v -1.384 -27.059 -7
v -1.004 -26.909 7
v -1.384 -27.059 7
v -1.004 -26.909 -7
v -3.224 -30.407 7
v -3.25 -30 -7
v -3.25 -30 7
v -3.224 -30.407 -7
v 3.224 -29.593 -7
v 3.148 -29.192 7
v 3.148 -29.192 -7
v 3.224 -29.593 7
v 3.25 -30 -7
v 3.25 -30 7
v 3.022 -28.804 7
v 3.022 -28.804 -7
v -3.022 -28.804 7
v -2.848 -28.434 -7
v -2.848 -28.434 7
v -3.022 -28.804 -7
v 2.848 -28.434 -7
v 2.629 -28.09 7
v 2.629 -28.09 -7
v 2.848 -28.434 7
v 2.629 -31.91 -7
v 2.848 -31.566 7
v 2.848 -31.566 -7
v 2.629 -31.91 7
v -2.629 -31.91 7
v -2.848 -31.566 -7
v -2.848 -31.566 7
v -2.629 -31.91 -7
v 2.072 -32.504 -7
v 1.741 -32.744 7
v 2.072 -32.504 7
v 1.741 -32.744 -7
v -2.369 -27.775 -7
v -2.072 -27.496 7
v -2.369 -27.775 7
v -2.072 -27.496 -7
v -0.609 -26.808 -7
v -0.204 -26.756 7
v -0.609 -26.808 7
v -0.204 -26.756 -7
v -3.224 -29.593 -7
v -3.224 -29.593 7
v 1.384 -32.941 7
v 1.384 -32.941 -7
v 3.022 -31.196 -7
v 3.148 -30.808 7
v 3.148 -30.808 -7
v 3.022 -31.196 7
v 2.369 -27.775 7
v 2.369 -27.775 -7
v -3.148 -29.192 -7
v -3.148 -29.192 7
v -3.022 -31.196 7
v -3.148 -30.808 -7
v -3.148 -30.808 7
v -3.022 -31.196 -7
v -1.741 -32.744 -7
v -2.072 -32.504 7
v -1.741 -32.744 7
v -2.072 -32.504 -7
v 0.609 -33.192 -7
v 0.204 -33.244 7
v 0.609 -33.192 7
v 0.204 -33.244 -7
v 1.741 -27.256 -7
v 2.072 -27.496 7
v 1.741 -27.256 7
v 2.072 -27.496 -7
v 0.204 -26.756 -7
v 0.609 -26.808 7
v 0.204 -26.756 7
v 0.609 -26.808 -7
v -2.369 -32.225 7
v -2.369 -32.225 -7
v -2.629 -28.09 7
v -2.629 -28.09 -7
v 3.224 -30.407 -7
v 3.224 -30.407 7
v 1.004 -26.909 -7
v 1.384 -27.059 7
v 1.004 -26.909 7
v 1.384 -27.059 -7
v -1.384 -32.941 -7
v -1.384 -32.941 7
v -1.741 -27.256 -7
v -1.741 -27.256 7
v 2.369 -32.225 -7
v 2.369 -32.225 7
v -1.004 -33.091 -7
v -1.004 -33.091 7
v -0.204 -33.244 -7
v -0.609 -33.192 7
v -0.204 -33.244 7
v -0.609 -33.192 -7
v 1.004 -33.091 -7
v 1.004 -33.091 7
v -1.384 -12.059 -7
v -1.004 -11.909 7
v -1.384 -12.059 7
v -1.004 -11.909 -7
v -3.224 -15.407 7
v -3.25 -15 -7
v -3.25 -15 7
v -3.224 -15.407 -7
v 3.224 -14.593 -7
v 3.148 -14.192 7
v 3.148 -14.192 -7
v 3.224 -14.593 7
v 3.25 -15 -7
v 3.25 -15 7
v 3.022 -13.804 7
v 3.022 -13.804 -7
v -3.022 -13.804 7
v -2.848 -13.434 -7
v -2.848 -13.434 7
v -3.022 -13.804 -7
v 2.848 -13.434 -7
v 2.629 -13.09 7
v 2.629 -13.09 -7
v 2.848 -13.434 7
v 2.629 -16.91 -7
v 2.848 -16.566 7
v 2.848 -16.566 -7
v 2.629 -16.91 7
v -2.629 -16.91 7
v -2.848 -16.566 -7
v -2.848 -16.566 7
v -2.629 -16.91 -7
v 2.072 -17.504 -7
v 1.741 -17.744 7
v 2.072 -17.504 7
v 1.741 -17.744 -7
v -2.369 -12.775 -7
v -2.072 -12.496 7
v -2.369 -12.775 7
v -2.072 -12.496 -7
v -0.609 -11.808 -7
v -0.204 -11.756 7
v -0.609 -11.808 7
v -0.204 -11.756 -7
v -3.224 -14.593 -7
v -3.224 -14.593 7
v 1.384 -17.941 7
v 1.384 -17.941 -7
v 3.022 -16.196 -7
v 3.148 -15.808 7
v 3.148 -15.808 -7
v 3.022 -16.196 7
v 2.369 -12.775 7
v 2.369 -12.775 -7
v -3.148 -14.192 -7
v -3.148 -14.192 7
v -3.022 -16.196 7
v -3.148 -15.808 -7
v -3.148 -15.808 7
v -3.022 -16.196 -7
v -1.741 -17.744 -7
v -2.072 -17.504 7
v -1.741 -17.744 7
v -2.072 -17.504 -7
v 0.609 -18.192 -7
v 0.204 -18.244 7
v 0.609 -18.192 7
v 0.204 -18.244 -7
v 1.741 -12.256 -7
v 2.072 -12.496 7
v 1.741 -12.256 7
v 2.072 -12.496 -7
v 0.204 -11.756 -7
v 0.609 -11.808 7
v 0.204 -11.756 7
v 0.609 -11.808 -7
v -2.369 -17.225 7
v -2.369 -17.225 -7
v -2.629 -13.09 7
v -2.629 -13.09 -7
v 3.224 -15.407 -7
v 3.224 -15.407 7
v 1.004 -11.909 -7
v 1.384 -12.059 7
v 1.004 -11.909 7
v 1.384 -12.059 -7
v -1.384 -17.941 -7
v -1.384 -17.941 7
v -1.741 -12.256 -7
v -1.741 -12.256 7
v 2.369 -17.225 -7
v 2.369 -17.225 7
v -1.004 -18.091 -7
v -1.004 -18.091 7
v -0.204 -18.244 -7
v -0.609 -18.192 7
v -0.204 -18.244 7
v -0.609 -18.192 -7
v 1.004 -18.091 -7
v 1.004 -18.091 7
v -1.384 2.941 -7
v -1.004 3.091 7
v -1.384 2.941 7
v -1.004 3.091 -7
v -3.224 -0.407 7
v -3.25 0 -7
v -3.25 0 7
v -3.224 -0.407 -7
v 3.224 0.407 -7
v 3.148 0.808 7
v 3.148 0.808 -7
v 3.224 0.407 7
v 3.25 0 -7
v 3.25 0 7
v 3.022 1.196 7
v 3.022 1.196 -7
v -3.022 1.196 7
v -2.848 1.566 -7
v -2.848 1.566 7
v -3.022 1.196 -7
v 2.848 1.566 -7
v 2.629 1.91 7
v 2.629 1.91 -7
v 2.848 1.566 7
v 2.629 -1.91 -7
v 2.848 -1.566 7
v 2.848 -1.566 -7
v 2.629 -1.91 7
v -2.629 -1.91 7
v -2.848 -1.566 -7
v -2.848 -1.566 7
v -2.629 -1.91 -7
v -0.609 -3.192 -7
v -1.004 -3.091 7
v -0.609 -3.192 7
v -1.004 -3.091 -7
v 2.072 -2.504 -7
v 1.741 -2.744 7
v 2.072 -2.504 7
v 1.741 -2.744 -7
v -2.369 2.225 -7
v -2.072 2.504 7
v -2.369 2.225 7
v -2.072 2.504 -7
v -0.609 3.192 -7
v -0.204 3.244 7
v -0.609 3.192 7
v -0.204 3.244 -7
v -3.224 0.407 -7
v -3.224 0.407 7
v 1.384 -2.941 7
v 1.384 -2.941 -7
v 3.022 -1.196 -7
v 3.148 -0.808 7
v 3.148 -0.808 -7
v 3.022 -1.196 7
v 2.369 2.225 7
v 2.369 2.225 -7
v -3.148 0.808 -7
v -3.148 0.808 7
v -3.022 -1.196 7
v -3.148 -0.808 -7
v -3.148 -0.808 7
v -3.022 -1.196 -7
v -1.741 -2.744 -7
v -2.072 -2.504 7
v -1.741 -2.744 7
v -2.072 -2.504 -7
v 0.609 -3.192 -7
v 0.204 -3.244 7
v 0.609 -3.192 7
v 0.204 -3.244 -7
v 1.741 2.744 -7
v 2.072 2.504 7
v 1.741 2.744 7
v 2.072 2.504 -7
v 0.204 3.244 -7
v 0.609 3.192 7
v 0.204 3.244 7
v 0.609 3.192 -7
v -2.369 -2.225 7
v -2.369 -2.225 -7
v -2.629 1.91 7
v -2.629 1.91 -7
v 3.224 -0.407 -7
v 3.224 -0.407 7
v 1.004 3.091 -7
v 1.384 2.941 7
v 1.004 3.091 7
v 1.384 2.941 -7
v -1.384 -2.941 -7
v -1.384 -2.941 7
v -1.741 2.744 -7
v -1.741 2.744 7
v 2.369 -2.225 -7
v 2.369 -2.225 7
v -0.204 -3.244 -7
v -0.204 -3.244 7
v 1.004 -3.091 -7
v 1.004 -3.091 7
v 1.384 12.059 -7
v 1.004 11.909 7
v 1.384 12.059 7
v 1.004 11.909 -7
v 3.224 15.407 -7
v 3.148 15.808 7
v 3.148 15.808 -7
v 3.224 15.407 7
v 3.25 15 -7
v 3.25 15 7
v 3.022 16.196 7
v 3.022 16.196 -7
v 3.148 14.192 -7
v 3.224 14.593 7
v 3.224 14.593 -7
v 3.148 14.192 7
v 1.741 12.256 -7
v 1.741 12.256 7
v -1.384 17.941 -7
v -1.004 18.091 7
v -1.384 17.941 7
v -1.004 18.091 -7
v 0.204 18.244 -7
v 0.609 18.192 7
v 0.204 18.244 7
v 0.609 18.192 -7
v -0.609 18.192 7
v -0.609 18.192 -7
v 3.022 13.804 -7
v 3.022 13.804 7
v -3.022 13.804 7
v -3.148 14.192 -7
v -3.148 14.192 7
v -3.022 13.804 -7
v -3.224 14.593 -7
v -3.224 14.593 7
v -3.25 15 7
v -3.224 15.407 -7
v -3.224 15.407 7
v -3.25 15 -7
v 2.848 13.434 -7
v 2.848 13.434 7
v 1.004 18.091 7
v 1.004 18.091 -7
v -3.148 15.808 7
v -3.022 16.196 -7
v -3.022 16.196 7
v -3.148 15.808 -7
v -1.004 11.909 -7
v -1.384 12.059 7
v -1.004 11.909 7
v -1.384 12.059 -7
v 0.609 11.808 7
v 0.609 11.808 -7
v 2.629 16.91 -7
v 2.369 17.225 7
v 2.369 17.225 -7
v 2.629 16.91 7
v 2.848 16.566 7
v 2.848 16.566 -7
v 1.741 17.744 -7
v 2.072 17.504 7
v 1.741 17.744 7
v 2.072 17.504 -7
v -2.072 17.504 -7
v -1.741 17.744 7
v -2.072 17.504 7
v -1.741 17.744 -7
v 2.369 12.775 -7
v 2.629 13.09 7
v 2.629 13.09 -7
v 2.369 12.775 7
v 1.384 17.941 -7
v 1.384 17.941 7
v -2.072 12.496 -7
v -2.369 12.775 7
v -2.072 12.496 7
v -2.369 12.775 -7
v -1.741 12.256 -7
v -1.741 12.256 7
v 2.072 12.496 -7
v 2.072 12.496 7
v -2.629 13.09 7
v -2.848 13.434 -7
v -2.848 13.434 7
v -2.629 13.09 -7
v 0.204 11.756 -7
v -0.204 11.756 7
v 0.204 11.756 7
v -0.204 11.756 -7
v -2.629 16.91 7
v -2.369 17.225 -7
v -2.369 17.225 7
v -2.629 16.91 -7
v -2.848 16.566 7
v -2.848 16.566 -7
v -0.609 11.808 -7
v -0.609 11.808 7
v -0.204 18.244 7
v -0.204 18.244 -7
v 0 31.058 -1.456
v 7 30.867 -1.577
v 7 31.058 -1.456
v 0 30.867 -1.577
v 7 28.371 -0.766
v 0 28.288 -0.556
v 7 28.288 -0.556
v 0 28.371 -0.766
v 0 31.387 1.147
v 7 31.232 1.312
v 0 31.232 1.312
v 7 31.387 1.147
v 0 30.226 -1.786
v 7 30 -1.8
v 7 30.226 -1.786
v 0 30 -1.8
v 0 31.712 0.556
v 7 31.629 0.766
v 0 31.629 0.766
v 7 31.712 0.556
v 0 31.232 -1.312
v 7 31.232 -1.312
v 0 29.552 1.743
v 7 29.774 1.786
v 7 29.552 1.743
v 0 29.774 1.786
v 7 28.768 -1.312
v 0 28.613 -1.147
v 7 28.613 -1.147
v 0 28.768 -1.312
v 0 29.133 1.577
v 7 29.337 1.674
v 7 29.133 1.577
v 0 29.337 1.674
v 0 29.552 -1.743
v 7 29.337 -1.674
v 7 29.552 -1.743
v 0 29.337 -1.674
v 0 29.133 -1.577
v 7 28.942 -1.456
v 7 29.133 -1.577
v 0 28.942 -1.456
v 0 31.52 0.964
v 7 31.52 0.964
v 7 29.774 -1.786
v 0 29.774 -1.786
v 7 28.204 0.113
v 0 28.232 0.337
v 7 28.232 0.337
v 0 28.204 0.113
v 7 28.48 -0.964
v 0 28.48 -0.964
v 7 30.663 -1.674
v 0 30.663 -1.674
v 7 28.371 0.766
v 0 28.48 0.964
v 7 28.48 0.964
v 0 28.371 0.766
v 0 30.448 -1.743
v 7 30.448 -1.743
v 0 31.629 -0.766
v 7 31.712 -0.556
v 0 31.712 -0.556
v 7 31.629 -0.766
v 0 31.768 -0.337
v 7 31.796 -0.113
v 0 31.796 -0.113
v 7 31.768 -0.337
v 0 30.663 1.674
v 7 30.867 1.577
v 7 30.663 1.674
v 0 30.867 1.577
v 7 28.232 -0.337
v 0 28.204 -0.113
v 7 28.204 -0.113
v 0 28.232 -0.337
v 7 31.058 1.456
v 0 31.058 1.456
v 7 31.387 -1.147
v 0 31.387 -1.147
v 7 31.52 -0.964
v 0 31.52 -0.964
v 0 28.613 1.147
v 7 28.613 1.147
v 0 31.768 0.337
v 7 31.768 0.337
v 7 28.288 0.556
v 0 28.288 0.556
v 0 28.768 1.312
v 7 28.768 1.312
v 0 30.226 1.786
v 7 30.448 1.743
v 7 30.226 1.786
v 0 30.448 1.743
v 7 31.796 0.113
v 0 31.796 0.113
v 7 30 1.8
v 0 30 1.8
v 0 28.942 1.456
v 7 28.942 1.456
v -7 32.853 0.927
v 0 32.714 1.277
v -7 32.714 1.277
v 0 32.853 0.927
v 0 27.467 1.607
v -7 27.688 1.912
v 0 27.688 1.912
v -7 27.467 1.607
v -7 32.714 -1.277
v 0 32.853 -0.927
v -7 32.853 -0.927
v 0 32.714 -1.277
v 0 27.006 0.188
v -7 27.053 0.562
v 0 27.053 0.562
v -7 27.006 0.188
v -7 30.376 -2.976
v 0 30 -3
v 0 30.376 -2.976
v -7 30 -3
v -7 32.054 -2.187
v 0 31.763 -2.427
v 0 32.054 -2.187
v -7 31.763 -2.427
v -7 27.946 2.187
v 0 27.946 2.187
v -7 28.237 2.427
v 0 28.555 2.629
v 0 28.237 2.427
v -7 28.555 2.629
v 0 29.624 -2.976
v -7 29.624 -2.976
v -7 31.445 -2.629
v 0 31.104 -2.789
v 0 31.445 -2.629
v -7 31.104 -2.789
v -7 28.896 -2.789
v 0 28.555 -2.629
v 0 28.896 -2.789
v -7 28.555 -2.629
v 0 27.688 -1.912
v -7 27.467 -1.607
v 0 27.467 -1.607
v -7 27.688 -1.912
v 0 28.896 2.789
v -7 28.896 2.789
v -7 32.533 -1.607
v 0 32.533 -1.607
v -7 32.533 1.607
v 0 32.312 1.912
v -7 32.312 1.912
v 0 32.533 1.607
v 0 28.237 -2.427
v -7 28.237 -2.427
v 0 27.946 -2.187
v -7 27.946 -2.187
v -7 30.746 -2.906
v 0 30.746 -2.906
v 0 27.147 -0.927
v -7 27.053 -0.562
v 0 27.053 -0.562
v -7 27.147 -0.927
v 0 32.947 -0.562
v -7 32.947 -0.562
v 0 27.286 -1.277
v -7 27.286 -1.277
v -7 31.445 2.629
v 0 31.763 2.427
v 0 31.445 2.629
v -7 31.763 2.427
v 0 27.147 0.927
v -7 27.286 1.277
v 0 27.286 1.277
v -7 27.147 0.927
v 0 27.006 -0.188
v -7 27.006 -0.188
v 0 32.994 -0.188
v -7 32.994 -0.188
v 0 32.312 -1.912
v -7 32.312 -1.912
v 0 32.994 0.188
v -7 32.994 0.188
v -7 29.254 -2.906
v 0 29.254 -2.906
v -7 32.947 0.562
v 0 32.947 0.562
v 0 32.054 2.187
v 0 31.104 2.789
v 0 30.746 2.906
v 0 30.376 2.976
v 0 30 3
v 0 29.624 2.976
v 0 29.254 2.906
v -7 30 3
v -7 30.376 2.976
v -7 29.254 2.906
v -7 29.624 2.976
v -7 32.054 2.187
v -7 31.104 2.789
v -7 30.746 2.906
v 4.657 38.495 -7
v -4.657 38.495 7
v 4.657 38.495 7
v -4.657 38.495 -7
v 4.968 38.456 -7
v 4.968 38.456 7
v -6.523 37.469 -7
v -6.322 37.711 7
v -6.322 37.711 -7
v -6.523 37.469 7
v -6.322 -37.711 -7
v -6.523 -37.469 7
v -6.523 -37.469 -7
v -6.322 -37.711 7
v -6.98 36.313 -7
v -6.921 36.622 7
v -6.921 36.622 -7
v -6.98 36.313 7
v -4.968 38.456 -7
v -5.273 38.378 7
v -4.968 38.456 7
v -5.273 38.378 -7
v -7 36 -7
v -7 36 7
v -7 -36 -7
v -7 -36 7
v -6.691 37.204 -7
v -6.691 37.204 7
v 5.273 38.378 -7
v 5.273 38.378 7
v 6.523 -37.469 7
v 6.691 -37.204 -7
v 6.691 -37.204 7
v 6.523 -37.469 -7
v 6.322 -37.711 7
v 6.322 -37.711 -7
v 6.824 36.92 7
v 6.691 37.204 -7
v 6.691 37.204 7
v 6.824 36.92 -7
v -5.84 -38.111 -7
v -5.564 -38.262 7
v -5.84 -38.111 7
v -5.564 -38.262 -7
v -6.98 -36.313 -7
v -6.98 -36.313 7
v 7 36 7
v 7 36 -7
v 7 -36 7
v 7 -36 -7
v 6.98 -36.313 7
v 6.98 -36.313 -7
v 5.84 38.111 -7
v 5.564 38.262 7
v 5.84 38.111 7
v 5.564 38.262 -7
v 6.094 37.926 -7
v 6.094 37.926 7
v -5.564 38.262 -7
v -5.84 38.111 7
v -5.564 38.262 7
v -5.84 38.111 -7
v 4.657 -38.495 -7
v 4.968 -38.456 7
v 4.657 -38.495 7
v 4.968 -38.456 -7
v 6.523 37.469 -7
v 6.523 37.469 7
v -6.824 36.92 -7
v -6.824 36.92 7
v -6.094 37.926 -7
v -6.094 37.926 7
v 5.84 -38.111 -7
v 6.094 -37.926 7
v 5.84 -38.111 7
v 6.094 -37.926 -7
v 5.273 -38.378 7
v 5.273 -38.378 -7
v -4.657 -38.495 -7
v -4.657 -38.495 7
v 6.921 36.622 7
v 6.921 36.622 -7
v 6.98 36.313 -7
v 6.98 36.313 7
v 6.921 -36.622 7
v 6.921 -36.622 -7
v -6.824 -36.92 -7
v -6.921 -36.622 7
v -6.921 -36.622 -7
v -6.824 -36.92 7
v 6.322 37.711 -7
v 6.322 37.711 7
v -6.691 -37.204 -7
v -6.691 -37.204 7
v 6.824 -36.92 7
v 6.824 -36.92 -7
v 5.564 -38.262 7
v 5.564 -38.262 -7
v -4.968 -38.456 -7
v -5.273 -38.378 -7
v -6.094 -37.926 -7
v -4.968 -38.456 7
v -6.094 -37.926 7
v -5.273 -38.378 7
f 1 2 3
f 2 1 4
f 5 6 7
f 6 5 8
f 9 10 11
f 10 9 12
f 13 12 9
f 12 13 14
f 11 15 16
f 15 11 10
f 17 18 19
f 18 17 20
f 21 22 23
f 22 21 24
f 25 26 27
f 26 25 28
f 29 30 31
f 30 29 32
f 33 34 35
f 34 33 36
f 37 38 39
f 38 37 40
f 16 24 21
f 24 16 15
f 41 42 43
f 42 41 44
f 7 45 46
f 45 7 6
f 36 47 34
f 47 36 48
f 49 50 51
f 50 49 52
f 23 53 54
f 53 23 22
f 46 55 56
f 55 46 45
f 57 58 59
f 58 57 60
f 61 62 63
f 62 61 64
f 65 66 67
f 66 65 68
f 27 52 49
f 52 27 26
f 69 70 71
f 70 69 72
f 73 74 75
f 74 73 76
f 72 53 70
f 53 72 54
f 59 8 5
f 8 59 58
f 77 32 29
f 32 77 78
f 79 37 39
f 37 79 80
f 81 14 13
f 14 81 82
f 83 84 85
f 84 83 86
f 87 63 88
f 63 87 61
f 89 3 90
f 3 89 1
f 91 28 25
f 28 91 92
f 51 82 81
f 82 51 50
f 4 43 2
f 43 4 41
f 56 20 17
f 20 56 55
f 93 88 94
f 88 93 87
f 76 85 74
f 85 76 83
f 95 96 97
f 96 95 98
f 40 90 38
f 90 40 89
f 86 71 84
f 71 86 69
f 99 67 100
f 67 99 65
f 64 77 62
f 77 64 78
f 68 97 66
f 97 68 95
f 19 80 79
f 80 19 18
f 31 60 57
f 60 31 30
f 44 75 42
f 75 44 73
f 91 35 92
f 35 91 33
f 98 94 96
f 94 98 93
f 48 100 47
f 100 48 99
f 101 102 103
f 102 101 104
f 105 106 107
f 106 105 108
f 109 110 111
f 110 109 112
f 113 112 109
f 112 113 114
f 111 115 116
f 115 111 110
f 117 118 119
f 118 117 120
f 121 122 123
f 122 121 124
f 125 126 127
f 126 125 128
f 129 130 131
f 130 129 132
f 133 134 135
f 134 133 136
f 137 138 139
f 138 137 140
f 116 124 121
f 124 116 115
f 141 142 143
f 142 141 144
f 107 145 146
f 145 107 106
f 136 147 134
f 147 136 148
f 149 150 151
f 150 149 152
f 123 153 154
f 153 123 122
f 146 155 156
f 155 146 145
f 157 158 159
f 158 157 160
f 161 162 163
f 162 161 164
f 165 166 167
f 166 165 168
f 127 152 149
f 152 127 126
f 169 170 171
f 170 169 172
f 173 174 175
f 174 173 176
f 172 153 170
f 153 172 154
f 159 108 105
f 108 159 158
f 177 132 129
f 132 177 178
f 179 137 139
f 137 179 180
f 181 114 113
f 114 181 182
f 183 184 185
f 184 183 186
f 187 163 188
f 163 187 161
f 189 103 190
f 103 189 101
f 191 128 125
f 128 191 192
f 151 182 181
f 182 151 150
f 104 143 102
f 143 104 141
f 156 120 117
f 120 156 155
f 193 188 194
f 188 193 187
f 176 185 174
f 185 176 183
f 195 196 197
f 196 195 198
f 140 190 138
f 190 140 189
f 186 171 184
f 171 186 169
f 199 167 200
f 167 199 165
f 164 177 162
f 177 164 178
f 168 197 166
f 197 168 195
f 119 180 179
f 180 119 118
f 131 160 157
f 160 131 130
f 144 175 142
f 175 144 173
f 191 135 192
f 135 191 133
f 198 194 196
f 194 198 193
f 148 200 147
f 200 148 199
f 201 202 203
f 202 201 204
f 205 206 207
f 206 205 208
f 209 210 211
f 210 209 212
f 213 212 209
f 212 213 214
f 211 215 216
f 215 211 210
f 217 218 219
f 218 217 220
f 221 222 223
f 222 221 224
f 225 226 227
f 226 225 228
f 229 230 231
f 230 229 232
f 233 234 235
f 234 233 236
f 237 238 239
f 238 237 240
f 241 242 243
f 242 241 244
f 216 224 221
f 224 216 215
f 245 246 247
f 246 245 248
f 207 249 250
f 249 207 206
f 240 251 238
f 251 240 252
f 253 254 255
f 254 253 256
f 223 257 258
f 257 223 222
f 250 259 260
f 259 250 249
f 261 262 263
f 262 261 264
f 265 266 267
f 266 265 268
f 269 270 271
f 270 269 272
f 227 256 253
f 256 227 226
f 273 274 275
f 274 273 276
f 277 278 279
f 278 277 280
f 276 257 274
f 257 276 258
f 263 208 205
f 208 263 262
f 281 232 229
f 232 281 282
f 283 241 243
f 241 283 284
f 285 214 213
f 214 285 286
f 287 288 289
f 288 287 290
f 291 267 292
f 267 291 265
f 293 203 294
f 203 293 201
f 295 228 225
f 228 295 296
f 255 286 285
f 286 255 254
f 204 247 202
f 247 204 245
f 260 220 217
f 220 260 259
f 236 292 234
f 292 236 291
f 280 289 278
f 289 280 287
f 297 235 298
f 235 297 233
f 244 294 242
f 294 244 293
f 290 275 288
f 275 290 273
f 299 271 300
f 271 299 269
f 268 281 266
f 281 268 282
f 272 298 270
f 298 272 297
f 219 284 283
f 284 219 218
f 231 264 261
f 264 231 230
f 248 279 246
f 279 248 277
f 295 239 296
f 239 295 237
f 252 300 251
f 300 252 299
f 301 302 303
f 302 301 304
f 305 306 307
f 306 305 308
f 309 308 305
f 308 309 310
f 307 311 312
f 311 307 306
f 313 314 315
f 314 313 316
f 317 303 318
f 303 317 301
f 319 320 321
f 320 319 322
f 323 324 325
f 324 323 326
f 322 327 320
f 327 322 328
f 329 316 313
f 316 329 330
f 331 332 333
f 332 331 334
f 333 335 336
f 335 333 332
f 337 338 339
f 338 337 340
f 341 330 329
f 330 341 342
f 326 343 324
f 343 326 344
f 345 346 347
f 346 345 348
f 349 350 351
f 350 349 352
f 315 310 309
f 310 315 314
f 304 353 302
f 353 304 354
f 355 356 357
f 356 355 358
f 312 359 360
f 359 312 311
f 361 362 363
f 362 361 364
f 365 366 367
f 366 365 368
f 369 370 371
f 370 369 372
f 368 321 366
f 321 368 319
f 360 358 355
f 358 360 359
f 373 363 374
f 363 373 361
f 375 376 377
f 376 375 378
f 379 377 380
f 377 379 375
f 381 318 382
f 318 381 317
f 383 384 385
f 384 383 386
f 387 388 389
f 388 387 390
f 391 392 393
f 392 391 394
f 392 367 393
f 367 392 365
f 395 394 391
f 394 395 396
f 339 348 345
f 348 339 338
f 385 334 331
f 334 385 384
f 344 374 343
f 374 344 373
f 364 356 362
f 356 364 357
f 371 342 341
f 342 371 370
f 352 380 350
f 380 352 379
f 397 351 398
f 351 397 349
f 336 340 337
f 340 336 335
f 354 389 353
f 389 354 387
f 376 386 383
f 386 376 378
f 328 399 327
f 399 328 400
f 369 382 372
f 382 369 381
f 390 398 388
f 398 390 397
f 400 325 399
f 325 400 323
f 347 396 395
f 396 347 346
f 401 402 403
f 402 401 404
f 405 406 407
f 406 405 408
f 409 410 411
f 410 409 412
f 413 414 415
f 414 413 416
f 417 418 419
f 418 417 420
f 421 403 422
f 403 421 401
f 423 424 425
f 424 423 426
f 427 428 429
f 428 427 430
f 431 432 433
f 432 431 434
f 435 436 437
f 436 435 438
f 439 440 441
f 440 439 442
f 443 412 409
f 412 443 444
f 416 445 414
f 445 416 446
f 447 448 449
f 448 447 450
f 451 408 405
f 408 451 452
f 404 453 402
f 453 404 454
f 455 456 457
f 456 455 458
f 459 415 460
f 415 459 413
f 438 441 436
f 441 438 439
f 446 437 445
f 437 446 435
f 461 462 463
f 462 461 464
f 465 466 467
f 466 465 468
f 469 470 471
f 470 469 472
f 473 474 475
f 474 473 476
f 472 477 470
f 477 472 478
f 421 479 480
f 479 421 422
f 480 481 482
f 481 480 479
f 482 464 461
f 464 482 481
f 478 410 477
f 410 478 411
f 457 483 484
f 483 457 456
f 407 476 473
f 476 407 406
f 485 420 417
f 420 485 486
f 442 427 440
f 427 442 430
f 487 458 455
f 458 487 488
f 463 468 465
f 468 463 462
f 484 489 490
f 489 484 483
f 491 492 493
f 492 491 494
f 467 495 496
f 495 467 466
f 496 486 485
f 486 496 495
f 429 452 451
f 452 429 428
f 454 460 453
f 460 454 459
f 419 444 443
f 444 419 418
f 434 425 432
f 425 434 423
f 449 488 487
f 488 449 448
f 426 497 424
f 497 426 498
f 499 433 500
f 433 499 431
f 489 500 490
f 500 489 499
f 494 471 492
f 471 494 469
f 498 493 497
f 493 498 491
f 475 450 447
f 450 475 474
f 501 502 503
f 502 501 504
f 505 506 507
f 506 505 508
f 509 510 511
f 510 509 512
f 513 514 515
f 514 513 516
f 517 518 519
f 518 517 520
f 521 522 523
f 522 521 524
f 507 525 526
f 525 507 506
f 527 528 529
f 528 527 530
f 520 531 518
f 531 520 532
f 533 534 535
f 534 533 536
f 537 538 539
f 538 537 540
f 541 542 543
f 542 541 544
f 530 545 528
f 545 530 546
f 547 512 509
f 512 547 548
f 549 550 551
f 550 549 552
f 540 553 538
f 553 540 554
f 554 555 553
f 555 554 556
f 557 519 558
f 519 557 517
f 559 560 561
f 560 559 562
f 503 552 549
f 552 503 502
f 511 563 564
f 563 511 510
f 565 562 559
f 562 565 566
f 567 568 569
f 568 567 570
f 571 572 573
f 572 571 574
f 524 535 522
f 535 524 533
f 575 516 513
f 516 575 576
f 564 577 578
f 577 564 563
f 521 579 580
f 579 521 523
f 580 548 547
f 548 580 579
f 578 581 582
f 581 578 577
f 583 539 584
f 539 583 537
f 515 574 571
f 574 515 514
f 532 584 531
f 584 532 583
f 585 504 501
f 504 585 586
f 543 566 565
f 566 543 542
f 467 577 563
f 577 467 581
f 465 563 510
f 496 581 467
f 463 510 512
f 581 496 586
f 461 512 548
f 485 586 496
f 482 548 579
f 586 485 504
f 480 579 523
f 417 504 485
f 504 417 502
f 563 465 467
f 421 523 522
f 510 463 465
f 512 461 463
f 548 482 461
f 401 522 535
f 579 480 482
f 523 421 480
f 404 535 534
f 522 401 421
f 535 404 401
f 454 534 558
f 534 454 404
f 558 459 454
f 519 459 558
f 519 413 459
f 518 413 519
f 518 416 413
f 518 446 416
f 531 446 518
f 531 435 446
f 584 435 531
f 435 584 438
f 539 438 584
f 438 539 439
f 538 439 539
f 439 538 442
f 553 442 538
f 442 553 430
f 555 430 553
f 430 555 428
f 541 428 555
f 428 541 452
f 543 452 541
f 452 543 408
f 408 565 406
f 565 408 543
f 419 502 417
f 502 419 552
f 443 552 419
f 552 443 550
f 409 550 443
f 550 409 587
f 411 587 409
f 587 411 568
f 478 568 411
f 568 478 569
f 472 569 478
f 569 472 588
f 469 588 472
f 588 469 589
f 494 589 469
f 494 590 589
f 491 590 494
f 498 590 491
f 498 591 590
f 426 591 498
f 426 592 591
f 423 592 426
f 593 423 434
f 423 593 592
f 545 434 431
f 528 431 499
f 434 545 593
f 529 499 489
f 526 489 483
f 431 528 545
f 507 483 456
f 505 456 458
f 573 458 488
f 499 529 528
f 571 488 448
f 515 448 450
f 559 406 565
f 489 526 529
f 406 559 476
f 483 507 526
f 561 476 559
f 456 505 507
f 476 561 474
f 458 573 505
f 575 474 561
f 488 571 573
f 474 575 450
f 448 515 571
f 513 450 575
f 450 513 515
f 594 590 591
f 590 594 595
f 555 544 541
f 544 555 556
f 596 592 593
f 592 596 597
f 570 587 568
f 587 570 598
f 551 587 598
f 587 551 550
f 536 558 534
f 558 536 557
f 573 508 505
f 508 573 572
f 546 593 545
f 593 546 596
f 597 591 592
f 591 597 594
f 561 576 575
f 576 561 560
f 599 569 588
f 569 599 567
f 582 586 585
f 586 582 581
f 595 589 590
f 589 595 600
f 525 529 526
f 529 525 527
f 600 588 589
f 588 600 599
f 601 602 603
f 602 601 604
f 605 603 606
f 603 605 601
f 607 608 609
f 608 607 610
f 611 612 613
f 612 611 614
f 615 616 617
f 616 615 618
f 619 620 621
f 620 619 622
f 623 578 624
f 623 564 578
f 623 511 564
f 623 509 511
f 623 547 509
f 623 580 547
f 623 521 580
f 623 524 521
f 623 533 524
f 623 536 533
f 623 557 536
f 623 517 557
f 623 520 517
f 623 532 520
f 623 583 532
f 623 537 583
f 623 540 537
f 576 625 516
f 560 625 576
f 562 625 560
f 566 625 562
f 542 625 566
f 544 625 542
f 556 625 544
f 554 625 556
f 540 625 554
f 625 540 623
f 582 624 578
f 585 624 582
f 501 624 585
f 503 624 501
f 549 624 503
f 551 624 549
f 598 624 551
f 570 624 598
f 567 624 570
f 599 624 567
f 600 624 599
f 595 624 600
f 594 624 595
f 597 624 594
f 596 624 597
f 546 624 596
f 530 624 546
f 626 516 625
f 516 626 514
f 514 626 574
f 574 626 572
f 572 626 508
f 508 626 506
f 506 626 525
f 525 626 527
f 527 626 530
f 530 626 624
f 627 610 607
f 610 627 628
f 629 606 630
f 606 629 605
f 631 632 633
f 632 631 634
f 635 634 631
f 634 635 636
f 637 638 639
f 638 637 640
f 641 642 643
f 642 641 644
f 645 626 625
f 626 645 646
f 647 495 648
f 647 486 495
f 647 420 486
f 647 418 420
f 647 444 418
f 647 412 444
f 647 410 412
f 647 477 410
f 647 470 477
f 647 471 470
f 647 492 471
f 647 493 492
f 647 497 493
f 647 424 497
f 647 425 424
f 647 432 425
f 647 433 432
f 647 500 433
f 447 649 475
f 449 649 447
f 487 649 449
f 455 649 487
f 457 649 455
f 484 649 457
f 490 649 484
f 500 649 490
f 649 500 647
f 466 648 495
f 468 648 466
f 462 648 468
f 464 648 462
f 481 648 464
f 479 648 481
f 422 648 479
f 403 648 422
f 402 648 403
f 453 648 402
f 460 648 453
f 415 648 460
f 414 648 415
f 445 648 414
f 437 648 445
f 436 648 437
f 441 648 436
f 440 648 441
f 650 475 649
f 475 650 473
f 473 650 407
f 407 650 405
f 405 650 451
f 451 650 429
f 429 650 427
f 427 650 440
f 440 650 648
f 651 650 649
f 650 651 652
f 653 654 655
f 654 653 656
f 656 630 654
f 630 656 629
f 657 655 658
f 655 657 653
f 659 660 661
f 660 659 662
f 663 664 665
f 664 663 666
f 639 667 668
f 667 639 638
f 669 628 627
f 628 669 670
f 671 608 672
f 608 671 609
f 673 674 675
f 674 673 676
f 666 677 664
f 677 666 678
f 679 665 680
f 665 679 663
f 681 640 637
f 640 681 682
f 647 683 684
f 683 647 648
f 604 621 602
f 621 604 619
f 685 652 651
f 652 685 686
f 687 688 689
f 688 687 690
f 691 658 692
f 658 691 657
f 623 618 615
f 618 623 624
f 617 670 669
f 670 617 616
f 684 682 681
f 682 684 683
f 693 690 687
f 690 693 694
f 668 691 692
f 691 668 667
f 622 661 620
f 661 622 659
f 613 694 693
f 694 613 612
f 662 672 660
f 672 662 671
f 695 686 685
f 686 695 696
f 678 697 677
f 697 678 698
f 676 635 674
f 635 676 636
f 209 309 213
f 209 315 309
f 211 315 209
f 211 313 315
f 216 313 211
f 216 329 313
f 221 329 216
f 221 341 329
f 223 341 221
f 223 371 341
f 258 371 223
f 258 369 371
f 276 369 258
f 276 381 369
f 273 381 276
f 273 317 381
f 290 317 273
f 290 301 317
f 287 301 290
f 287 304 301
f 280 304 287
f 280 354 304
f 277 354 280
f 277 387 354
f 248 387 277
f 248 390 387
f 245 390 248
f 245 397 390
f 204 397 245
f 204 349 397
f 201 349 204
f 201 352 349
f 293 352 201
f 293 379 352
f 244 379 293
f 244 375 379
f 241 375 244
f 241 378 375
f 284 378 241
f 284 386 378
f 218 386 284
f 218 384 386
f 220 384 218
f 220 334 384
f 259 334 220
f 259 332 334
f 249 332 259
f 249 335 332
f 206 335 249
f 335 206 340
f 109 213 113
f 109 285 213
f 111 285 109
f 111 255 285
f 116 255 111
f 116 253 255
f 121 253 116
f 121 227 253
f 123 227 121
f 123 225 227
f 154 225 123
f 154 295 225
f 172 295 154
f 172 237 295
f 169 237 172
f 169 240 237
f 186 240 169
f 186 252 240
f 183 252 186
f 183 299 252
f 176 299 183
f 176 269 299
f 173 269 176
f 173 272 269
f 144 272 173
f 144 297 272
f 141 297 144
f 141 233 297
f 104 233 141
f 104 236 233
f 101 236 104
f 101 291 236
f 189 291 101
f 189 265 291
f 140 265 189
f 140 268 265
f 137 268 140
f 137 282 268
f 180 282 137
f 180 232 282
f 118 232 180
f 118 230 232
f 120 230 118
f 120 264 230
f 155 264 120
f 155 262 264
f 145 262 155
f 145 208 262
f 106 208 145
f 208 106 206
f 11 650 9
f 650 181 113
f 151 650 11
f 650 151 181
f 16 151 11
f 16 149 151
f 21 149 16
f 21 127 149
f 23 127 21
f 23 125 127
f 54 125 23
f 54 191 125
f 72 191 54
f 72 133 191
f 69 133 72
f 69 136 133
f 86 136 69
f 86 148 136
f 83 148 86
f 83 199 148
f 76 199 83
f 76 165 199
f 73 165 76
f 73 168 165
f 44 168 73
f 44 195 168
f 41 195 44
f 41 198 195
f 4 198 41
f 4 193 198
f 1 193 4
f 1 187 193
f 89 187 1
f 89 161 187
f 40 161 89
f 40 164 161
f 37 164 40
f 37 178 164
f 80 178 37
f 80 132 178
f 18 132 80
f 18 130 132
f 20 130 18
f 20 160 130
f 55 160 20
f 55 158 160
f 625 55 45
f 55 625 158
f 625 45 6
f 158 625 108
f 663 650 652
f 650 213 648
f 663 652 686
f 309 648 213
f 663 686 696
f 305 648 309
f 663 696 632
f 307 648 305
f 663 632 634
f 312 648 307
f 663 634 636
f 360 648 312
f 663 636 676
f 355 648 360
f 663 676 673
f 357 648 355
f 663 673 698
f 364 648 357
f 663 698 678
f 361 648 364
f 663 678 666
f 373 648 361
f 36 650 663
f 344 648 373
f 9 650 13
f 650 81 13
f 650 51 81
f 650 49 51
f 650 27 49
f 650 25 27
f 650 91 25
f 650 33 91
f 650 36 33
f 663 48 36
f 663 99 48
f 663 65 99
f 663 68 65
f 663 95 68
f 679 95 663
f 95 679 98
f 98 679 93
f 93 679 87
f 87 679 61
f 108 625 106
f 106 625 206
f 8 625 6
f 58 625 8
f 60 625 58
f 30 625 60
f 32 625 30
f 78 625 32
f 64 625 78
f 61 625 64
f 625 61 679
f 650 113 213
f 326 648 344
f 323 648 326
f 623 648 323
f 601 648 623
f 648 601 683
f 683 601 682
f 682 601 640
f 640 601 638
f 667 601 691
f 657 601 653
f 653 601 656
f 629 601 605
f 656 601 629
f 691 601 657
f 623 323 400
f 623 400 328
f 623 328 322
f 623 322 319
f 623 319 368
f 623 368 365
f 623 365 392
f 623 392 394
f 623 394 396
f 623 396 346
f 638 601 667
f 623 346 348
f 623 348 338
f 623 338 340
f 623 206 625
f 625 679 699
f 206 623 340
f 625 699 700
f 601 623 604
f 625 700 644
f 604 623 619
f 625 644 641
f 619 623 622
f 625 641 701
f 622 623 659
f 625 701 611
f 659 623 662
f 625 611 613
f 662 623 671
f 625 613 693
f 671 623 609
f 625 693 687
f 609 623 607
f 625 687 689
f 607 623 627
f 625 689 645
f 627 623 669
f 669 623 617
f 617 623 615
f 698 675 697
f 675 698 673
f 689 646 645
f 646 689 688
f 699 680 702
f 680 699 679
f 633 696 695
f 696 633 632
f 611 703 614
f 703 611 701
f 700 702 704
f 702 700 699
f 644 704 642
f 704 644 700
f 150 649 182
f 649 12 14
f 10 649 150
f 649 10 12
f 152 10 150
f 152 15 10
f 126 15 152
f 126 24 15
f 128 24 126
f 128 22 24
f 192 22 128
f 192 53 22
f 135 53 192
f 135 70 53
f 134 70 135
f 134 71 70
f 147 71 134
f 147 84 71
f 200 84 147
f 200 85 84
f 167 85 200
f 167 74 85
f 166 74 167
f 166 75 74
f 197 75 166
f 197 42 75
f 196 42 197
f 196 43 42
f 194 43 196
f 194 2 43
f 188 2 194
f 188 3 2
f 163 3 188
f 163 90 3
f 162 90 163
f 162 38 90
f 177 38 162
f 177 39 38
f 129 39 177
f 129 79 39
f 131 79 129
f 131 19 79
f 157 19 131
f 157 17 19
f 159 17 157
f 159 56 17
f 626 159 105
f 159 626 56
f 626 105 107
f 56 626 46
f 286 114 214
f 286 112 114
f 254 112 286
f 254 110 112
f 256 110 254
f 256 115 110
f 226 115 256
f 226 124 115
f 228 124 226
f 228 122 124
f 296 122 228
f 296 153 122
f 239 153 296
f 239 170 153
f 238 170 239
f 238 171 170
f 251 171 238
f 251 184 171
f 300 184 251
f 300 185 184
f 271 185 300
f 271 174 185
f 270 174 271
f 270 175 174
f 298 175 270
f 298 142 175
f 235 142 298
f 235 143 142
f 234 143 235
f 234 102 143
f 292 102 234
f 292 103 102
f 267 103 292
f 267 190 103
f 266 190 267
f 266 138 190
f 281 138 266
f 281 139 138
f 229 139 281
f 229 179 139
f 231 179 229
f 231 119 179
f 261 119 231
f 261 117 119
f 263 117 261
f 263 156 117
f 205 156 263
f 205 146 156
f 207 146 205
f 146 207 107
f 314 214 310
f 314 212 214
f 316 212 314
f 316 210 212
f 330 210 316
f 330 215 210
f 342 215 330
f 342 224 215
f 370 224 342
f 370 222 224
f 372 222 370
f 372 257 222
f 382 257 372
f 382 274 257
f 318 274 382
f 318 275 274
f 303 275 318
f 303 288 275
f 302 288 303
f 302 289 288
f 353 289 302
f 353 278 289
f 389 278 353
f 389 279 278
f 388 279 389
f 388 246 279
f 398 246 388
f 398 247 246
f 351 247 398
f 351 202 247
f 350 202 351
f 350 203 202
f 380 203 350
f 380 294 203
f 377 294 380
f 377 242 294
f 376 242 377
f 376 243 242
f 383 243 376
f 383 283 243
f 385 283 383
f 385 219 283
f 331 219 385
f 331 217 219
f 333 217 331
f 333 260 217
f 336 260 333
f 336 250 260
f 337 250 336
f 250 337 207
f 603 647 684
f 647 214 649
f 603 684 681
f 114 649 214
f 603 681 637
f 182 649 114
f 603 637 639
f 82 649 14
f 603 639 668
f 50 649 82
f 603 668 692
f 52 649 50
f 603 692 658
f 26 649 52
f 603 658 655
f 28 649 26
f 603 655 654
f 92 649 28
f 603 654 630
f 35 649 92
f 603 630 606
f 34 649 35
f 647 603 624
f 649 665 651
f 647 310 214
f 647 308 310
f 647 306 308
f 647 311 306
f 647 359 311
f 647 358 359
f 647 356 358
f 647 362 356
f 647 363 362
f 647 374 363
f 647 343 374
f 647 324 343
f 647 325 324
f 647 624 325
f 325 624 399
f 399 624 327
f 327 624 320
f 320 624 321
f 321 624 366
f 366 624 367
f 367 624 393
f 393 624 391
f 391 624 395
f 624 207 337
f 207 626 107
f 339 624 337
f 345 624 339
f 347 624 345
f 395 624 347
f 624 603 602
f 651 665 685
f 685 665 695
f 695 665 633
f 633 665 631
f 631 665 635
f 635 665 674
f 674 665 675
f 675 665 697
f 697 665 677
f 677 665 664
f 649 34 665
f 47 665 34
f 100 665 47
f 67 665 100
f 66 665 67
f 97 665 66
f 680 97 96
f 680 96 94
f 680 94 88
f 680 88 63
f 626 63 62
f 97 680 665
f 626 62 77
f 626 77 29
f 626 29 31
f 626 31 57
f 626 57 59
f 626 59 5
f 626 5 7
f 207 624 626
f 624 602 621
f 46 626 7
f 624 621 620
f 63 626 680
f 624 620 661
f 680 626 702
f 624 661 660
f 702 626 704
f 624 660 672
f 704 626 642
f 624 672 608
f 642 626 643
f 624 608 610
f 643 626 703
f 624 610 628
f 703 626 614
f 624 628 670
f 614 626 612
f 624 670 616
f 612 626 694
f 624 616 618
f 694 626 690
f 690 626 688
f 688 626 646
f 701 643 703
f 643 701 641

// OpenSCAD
$fn = 50;


difference() {
	union() {
		translate(v = [0, 0, -7.0000000000]) {
			hull() {
				translate(v = [-4.5000000000, 36.0000000000, 0]) {
					cylinder(h = 14, r = 2.5000000000);
				}
				translate(v = [4.5000000000, 36.0000000000, 0]) {
					cylinder(h = 14, r = 2.5000000000);
				}
				translate(v = [-4.5000000000, -36.0000000000, 0]) {
					cylinder(h = 14, r = 2.5000000000);
				}
				translate(v = [4.5000000000, -36.0000000000, 0]) {
					cylinder(h = 14, r = 2.5000000000);
				}
			}
		}
	}
	union() {
		translate(v = [0.0000000000, -30.0000000000, -50.0000000000]) {
			cylinder(h = 100, r = 3.2500000000);
		}
		translate(v = [0.0000000000, -15.0000000000, -50.0000000000]) {
			cylinder(h = 100, r = 3.2500000000);
		}
		translate(v = [0.0000000000, 0.0000000000, -50.0000000000]) {
			cylinder(h = 100, r = 3.2500000000);
		}
		translate(v = [0.0000000000, 15.0000000000, -50.0000000000]) {
			cylinder(h = 100, r = 3.2500000000);
		}
		translate(v = [-50, 30, 0]) {
			rotate(a = [0, 90, 0]) {
				cylinder(h = 100, r = 1.8000000000);
			}
		}
		translate(v = [-100, 30, 0]) {
			rotate(a = [0, 90, 0]) {
				cylinder(h = 100, r = 3.0000000000);
			}
		}
	}
}
